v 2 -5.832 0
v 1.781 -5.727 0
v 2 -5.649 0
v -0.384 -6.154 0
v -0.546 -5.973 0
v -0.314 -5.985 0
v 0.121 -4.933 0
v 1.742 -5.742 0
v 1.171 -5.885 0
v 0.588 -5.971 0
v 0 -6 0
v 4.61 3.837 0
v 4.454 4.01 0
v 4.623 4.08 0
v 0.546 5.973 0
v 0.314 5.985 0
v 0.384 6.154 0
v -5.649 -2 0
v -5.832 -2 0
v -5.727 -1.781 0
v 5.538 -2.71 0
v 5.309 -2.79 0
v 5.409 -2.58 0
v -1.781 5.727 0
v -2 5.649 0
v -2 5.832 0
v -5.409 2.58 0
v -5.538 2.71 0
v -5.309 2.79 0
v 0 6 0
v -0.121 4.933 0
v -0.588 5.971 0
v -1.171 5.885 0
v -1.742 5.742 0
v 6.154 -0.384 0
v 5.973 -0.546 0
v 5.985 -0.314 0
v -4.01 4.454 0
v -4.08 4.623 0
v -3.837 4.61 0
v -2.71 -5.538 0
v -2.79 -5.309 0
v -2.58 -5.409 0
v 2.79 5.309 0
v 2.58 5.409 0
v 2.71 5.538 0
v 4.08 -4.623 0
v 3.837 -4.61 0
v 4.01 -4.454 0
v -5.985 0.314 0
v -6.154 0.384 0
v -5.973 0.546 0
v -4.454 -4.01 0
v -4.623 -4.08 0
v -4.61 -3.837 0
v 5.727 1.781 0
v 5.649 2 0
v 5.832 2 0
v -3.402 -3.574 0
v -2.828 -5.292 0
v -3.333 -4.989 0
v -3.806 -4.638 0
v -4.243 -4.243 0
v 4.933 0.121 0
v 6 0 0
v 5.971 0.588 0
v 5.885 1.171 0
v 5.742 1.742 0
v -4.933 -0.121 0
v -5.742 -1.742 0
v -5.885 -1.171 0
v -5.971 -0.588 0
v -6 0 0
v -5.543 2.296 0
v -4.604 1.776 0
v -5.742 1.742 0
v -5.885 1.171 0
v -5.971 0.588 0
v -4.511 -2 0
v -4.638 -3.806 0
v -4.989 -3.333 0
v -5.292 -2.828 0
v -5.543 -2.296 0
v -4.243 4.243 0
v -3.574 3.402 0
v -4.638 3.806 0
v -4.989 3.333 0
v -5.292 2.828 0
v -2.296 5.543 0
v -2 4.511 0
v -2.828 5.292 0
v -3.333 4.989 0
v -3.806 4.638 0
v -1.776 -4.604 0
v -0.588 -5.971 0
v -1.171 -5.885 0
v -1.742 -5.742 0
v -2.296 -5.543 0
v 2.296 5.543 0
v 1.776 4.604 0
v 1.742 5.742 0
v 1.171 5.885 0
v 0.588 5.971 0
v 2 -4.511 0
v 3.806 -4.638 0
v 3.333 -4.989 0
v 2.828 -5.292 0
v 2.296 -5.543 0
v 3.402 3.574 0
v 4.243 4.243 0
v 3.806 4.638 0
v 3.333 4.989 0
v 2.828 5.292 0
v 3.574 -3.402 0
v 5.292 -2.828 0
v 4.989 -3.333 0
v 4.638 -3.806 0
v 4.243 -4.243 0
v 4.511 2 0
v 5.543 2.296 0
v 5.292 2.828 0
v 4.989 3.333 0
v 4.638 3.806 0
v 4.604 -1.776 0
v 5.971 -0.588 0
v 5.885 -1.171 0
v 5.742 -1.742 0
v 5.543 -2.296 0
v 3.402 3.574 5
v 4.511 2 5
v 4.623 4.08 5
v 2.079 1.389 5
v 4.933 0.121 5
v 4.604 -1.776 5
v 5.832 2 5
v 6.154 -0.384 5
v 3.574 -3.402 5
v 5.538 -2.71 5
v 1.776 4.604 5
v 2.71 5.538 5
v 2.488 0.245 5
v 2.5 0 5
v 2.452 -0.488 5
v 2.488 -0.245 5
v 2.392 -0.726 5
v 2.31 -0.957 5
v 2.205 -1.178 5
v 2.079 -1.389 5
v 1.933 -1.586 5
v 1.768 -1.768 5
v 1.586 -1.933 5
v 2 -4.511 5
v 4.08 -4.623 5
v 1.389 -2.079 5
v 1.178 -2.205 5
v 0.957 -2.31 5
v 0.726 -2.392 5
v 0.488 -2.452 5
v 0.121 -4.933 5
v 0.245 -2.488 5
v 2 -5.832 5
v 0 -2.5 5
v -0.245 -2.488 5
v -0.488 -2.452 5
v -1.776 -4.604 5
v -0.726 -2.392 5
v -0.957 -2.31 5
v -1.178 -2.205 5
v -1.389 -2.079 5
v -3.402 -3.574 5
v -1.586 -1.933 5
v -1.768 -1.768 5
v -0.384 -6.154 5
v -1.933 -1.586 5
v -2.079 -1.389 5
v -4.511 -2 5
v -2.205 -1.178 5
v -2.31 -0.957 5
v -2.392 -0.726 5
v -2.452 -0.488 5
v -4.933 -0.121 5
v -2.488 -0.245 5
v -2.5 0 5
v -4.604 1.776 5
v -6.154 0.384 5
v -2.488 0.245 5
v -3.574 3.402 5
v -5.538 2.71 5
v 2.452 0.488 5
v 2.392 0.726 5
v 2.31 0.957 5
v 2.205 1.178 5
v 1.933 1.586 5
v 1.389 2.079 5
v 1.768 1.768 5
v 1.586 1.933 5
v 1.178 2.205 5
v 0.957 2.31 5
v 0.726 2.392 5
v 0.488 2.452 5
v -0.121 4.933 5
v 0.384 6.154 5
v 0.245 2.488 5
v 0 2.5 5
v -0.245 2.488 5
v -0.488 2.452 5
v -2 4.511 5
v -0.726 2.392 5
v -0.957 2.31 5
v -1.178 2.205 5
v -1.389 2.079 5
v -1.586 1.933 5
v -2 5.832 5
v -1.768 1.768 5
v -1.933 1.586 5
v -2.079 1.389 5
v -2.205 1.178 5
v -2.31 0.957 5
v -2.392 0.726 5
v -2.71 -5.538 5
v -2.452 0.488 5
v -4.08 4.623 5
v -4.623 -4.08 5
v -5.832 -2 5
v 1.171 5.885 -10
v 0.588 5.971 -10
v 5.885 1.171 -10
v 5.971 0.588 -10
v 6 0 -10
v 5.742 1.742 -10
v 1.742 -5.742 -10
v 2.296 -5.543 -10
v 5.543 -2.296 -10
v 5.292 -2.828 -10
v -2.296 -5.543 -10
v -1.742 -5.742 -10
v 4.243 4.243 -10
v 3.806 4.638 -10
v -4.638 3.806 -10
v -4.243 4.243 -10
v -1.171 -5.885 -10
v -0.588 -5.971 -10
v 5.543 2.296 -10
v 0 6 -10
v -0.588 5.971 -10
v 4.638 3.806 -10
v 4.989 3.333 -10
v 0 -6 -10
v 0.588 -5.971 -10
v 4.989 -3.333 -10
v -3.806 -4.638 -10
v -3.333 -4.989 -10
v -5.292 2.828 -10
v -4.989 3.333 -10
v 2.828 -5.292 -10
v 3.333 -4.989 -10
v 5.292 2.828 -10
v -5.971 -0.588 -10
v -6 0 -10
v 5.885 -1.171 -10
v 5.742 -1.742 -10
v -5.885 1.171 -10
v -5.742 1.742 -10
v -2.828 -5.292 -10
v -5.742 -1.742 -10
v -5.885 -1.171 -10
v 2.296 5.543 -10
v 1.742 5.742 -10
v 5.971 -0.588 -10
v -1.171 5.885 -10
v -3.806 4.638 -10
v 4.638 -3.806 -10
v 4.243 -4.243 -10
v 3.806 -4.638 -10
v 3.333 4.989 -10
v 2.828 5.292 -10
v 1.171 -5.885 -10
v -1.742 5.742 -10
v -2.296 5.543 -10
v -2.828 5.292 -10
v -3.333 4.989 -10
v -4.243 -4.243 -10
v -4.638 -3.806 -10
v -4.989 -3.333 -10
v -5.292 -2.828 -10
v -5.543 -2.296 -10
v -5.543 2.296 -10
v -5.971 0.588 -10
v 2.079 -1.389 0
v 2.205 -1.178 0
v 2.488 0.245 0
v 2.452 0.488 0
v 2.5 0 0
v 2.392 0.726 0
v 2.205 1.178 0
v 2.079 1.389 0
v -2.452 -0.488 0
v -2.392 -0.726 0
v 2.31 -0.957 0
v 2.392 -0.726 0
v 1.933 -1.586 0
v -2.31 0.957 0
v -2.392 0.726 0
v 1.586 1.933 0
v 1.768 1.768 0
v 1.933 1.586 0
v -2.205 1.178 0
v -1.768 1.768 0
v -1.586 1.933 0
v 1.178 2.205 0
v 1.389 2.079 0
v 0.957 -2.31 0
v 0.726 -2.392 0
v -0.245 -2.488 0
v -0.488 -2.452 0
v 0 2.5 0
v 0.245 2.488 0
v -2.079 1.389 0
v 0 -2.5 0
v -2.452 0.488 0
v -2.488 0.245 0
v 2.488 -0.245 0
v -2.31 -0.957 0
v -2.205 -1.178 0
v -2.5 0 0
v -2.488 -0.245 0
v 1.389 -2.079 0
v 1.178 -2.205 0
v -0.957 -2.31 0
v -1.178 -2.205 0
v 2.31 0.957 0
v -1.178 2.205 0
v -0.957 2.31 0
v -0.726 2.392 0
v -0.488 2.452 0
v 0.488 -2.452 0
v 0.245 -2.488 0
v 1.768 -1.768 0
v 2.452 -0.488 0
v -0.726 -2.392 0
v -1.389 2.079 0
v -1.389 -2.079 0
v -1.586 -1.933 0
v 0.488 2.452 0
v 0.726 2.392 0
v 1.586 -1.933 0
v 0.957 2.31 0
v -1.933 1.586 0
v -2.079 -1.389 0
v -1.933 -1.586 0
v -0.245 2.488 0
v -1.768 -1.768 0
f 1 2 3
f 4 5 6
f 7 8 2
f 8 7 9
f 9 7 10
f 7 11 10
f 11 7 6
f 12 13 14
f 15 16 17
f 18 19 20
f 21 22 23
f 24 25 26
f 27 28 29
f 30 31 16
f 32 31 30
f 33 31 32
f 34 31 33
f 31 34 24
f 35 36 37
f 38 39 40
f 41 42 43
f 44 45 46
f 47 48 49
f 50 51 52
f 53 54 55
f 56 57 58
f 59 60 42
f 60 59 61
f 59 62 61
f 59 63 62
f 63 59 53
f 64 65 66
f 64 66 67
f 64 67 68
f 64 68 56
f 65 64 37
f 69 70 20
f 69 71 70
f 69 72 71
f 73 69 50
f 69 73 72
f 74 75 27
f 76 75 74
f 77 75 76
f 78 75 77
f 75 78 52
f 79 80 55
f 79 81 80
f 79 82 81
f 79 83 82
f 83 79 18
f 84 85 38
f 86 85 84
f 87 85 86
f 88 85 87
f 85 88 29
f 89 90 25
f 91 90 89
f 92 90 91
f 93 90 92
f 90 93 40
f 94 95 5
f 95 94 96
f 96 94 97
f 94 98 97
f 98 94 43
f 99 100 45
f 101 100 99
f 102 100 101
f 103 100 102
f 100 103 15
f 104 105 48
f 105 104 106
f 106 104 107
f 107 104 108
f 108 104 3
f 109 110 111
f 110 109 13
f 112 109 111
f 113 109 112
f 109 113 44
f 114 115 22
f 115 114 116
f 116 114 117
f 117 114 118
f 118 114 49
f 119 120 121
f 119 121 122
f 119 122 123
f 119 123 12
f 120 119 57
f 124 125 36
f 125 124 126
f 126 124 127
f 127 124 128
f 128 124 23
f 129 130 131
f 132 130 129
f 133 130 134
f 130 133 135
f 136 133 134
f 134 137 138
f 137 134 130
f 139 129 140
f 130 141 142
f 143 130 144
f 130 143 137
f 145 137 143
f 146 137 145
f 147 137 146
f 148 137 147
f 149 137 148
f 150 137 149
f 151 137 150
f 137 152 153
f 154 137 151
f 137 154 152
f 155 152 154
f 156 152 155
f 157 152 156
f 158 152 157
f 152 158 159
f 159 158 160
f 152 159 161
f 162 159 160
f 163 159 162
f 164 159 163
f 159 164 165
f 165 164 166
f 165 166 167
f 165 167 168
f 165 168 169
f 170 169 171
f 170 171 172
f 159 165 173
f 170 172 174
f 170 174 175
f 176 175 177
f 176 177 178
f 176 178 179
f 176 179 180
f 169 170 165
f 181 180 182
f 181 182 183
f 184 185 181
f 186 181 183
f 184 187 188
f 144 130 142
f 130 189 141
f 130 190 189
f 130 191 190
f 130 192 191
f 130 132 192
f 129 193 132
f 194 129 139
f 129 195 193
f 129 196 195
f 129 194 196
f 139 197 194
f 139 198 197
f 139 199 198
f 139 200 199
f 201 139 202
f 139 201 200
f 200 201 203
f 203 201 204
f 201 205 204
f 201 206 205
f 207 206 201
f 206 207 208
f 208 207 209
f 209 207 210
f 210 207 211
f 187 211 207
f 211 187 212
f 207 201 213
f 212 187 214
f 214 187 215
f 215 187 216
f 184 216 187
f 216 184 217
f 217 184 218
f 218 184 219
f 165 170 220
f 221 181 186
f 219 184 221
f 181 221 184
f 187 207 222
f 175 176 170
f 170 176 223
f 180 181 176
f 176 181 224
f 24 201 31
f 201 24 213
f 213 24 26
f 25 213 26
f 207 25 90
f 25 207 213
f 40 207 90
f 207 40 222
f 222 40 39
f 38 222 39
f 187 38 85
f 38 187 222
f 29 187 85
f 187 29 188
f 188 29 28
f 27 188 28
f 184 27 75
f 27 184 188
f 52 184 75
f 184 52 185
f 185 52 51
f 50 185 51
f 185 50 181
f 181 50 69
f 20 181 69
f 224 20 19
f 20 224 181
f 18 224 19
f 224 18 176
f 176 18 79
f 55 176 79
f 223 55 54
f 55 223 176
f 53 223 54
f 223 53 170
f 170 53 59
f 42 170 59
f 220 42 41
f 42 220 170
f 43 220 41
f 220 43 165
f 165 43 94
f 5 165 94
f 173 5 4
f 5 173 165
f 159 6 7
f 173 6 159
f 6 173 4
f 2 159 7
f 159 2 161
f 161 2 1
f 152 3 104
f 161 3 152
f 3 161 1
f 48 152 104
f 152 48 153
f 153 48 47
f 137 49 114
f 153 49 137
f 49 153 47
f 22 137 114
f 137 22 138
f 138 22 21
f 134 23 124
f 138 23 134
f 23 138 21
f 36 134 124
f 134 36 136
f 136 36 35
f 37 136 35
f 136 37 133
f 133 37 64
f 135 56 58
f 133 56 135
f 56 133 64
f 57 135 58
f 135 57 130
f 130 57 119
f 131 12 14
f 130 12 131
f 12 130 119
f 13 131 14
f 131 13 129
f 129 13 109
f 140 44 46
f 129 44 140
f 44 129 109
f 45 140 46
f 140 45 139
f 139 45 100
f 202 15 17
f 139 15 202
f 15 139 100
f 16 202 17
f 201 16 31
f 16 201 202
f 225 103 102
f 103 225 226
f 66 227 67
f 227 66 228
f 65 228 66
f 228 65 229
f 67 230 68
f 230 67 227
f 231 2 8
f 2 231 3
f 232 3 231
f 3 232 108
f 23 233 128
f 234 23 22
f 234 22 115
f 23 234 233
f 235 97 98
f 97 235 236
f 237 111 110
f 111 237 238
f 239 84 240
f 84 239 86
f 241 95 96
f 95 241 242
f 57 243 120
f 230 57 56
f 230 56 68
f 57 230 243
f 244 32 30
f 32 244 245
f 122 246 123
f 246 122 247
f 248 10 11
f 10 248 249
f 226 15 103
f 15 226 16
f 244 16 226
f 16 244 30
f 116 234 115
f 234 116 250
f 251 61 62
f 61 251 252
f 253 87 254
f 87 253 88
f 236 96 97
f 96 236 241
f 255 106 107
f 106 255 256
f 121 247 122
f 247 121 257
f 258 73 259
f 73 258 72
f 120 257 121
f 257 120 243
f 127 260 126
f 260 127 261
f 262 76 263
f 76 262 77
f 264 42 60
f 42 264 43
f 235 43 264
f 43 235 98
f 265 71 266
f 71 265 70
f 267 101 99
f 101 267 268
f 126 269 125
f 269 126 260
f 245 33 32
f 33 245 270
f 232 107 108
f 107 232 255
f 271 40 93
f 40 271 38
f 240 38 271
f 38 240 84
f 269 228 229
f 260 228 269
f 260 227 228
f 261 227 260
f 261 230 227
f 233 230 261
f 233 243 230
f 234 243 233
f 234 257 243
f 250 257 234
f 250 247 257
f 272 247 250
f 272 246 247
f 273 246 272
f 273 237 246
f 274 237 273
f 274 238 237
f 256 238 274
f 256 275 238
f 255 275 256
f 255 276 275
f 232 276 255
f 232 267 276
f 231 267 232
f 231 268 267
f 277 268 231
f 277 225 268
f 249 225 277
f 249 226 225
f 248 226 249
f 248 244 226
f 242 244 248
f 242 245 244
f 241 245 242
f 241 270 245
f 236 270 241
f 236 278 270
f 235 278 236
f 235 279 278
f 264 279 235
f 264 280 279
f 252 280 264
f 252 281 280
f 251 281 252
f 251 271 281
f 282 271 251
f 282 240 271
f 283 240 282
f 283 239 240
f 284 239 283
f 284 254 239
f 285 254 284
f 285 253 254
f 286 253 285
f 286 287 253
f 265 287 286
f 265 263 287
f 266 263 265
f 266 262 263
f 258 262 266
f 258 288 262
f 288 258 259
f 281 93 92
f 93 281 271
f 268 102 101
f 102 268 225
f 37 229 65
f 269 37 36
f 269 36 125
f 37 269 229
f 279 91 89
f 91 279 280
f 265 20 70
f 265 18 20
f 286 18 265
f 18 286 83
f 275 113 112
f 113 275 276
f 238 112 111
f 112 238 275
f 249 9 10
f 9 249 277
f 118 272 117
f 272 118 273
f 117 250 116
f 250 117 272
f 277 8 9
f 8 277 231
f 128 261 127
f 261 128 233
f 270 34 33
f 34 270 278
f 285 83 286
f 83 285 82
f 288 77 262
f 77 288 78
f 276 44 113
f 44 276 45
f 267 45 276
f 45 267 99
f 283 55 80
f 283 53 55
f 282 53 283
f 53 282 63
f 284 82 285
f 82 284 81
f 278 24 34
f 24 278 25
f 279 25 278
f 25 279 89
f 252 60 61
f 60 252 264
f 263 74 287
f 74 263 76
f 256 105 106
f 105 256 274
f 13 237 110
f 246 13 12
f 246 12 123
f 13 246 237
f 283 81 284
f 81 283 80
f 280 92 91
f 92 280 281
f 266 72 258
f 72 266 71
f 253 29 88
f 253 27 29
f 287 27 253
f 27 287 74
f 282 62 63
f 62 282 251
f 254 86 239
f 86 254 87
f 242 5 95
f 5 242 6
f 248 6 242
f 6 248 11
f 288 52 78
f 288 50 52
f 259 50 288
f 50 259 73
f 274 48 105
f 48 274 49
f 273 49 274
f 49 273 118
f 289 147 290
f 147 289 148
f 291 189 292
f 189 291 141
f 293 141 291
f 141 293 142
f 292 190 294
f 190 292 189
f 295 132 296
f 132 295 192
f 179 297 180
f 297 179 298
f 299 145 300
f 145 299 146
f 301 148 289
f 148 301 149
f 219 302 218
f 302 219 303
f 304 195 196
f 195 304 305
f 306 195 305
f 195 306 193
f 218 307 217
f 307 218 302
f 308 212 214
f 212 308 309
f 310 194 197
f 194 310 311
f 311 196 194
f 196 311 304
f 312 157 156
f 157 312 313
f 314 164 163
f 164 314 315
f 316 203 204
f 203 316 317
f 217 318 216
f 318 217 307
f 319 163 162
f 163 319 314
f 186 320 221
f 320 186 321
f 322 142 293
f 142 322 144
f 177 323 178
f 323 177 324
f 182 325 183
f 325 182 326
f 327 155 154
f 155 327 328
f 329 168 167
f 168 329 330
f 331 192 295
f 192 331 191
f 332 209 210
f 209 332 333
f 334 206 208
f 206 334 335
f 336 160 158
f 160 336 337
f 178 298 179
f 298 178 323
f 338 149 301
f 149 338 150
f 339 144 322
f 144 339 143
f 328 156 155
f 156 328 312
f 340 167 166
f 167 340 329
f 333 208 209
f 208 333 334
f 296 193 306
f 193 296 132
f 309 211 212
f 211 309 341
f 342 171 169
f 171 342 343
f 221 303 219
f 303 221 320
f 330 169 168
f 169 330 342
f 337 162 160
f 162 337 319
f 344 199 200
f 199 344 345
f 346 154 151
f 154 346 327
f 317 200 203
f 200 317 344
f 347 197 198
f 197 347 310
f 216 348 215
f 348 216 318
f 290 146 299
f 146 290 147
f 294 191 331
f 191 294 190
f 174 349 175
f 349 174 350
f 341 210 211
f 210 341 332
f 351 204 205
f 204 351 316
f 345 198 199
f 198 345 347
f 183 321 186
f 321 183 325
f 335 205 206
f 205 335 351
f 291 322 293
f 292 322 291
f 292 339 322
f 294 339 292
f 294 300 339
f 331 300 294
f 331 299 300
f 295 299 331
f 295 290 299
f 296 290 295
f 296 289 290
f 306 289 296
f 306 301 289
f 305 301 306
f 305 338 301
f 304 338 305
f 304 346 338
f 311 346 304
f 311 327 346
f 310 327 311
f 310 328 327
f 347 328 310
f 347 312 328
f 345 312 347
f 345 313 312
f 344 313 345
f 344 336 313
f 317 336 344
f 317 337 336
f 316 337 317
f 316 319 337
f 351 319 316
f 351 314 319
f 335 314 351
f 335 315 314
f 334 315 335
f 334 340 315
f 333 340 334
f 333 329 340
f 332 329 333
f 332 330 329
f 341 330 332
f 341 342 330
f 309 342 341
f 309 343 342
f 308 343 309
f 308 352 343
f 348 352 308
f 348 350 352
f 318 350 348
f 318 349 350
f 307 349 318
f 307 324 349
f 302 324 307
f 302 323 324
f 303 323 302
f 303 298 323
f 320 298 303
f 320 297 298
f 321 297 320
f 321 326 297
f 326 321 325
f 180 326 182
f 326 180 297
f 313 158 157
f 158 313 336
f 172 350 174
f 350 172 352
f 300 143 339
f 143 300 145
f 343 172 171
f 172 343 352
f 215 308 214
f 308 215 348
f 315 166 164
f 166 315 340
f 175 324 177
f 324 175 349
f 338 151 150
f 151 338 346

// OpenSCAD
module timing_pulley(teeth=16, pitch_diameter=9.75, belt_width=5, hub_diameter=12, hub_height=10) {
    tooth_height = 2;
    tooth_width = pitch_diameter * PI / teeth;
    pulley_height = belt_width + hub_height;
    
    module tooth() {
        translate([0, pitch_diameter / 2, 0])
        rotate([0, 0, 90])
        linear_extrude(height=belt_width)
        polygon(points=[[0, 0], [tooth_width / 2, tooth_height], [-tooth_width / 2, tooth_height]]);
    }
    
    difference() {
        union() {
            // Main pulley body
            cylinder(d=pitch_diameter, h=belt_width, $fn=64);
            
            // Hub
            translate([0, 0, -hub_height])
            cylinder(d=hub_diameter, h=hub_height, $fn=64);
            
            // Teeth
            for (i = [0:teeth-1]) {
                rotate([0, 0, i * 360 / teeth])
                tooth();
            }
        }
        
        // Bore hole
        cylinder(d=5, h=pulley_height, $fn=64);
    }
}

timing_pulley();
